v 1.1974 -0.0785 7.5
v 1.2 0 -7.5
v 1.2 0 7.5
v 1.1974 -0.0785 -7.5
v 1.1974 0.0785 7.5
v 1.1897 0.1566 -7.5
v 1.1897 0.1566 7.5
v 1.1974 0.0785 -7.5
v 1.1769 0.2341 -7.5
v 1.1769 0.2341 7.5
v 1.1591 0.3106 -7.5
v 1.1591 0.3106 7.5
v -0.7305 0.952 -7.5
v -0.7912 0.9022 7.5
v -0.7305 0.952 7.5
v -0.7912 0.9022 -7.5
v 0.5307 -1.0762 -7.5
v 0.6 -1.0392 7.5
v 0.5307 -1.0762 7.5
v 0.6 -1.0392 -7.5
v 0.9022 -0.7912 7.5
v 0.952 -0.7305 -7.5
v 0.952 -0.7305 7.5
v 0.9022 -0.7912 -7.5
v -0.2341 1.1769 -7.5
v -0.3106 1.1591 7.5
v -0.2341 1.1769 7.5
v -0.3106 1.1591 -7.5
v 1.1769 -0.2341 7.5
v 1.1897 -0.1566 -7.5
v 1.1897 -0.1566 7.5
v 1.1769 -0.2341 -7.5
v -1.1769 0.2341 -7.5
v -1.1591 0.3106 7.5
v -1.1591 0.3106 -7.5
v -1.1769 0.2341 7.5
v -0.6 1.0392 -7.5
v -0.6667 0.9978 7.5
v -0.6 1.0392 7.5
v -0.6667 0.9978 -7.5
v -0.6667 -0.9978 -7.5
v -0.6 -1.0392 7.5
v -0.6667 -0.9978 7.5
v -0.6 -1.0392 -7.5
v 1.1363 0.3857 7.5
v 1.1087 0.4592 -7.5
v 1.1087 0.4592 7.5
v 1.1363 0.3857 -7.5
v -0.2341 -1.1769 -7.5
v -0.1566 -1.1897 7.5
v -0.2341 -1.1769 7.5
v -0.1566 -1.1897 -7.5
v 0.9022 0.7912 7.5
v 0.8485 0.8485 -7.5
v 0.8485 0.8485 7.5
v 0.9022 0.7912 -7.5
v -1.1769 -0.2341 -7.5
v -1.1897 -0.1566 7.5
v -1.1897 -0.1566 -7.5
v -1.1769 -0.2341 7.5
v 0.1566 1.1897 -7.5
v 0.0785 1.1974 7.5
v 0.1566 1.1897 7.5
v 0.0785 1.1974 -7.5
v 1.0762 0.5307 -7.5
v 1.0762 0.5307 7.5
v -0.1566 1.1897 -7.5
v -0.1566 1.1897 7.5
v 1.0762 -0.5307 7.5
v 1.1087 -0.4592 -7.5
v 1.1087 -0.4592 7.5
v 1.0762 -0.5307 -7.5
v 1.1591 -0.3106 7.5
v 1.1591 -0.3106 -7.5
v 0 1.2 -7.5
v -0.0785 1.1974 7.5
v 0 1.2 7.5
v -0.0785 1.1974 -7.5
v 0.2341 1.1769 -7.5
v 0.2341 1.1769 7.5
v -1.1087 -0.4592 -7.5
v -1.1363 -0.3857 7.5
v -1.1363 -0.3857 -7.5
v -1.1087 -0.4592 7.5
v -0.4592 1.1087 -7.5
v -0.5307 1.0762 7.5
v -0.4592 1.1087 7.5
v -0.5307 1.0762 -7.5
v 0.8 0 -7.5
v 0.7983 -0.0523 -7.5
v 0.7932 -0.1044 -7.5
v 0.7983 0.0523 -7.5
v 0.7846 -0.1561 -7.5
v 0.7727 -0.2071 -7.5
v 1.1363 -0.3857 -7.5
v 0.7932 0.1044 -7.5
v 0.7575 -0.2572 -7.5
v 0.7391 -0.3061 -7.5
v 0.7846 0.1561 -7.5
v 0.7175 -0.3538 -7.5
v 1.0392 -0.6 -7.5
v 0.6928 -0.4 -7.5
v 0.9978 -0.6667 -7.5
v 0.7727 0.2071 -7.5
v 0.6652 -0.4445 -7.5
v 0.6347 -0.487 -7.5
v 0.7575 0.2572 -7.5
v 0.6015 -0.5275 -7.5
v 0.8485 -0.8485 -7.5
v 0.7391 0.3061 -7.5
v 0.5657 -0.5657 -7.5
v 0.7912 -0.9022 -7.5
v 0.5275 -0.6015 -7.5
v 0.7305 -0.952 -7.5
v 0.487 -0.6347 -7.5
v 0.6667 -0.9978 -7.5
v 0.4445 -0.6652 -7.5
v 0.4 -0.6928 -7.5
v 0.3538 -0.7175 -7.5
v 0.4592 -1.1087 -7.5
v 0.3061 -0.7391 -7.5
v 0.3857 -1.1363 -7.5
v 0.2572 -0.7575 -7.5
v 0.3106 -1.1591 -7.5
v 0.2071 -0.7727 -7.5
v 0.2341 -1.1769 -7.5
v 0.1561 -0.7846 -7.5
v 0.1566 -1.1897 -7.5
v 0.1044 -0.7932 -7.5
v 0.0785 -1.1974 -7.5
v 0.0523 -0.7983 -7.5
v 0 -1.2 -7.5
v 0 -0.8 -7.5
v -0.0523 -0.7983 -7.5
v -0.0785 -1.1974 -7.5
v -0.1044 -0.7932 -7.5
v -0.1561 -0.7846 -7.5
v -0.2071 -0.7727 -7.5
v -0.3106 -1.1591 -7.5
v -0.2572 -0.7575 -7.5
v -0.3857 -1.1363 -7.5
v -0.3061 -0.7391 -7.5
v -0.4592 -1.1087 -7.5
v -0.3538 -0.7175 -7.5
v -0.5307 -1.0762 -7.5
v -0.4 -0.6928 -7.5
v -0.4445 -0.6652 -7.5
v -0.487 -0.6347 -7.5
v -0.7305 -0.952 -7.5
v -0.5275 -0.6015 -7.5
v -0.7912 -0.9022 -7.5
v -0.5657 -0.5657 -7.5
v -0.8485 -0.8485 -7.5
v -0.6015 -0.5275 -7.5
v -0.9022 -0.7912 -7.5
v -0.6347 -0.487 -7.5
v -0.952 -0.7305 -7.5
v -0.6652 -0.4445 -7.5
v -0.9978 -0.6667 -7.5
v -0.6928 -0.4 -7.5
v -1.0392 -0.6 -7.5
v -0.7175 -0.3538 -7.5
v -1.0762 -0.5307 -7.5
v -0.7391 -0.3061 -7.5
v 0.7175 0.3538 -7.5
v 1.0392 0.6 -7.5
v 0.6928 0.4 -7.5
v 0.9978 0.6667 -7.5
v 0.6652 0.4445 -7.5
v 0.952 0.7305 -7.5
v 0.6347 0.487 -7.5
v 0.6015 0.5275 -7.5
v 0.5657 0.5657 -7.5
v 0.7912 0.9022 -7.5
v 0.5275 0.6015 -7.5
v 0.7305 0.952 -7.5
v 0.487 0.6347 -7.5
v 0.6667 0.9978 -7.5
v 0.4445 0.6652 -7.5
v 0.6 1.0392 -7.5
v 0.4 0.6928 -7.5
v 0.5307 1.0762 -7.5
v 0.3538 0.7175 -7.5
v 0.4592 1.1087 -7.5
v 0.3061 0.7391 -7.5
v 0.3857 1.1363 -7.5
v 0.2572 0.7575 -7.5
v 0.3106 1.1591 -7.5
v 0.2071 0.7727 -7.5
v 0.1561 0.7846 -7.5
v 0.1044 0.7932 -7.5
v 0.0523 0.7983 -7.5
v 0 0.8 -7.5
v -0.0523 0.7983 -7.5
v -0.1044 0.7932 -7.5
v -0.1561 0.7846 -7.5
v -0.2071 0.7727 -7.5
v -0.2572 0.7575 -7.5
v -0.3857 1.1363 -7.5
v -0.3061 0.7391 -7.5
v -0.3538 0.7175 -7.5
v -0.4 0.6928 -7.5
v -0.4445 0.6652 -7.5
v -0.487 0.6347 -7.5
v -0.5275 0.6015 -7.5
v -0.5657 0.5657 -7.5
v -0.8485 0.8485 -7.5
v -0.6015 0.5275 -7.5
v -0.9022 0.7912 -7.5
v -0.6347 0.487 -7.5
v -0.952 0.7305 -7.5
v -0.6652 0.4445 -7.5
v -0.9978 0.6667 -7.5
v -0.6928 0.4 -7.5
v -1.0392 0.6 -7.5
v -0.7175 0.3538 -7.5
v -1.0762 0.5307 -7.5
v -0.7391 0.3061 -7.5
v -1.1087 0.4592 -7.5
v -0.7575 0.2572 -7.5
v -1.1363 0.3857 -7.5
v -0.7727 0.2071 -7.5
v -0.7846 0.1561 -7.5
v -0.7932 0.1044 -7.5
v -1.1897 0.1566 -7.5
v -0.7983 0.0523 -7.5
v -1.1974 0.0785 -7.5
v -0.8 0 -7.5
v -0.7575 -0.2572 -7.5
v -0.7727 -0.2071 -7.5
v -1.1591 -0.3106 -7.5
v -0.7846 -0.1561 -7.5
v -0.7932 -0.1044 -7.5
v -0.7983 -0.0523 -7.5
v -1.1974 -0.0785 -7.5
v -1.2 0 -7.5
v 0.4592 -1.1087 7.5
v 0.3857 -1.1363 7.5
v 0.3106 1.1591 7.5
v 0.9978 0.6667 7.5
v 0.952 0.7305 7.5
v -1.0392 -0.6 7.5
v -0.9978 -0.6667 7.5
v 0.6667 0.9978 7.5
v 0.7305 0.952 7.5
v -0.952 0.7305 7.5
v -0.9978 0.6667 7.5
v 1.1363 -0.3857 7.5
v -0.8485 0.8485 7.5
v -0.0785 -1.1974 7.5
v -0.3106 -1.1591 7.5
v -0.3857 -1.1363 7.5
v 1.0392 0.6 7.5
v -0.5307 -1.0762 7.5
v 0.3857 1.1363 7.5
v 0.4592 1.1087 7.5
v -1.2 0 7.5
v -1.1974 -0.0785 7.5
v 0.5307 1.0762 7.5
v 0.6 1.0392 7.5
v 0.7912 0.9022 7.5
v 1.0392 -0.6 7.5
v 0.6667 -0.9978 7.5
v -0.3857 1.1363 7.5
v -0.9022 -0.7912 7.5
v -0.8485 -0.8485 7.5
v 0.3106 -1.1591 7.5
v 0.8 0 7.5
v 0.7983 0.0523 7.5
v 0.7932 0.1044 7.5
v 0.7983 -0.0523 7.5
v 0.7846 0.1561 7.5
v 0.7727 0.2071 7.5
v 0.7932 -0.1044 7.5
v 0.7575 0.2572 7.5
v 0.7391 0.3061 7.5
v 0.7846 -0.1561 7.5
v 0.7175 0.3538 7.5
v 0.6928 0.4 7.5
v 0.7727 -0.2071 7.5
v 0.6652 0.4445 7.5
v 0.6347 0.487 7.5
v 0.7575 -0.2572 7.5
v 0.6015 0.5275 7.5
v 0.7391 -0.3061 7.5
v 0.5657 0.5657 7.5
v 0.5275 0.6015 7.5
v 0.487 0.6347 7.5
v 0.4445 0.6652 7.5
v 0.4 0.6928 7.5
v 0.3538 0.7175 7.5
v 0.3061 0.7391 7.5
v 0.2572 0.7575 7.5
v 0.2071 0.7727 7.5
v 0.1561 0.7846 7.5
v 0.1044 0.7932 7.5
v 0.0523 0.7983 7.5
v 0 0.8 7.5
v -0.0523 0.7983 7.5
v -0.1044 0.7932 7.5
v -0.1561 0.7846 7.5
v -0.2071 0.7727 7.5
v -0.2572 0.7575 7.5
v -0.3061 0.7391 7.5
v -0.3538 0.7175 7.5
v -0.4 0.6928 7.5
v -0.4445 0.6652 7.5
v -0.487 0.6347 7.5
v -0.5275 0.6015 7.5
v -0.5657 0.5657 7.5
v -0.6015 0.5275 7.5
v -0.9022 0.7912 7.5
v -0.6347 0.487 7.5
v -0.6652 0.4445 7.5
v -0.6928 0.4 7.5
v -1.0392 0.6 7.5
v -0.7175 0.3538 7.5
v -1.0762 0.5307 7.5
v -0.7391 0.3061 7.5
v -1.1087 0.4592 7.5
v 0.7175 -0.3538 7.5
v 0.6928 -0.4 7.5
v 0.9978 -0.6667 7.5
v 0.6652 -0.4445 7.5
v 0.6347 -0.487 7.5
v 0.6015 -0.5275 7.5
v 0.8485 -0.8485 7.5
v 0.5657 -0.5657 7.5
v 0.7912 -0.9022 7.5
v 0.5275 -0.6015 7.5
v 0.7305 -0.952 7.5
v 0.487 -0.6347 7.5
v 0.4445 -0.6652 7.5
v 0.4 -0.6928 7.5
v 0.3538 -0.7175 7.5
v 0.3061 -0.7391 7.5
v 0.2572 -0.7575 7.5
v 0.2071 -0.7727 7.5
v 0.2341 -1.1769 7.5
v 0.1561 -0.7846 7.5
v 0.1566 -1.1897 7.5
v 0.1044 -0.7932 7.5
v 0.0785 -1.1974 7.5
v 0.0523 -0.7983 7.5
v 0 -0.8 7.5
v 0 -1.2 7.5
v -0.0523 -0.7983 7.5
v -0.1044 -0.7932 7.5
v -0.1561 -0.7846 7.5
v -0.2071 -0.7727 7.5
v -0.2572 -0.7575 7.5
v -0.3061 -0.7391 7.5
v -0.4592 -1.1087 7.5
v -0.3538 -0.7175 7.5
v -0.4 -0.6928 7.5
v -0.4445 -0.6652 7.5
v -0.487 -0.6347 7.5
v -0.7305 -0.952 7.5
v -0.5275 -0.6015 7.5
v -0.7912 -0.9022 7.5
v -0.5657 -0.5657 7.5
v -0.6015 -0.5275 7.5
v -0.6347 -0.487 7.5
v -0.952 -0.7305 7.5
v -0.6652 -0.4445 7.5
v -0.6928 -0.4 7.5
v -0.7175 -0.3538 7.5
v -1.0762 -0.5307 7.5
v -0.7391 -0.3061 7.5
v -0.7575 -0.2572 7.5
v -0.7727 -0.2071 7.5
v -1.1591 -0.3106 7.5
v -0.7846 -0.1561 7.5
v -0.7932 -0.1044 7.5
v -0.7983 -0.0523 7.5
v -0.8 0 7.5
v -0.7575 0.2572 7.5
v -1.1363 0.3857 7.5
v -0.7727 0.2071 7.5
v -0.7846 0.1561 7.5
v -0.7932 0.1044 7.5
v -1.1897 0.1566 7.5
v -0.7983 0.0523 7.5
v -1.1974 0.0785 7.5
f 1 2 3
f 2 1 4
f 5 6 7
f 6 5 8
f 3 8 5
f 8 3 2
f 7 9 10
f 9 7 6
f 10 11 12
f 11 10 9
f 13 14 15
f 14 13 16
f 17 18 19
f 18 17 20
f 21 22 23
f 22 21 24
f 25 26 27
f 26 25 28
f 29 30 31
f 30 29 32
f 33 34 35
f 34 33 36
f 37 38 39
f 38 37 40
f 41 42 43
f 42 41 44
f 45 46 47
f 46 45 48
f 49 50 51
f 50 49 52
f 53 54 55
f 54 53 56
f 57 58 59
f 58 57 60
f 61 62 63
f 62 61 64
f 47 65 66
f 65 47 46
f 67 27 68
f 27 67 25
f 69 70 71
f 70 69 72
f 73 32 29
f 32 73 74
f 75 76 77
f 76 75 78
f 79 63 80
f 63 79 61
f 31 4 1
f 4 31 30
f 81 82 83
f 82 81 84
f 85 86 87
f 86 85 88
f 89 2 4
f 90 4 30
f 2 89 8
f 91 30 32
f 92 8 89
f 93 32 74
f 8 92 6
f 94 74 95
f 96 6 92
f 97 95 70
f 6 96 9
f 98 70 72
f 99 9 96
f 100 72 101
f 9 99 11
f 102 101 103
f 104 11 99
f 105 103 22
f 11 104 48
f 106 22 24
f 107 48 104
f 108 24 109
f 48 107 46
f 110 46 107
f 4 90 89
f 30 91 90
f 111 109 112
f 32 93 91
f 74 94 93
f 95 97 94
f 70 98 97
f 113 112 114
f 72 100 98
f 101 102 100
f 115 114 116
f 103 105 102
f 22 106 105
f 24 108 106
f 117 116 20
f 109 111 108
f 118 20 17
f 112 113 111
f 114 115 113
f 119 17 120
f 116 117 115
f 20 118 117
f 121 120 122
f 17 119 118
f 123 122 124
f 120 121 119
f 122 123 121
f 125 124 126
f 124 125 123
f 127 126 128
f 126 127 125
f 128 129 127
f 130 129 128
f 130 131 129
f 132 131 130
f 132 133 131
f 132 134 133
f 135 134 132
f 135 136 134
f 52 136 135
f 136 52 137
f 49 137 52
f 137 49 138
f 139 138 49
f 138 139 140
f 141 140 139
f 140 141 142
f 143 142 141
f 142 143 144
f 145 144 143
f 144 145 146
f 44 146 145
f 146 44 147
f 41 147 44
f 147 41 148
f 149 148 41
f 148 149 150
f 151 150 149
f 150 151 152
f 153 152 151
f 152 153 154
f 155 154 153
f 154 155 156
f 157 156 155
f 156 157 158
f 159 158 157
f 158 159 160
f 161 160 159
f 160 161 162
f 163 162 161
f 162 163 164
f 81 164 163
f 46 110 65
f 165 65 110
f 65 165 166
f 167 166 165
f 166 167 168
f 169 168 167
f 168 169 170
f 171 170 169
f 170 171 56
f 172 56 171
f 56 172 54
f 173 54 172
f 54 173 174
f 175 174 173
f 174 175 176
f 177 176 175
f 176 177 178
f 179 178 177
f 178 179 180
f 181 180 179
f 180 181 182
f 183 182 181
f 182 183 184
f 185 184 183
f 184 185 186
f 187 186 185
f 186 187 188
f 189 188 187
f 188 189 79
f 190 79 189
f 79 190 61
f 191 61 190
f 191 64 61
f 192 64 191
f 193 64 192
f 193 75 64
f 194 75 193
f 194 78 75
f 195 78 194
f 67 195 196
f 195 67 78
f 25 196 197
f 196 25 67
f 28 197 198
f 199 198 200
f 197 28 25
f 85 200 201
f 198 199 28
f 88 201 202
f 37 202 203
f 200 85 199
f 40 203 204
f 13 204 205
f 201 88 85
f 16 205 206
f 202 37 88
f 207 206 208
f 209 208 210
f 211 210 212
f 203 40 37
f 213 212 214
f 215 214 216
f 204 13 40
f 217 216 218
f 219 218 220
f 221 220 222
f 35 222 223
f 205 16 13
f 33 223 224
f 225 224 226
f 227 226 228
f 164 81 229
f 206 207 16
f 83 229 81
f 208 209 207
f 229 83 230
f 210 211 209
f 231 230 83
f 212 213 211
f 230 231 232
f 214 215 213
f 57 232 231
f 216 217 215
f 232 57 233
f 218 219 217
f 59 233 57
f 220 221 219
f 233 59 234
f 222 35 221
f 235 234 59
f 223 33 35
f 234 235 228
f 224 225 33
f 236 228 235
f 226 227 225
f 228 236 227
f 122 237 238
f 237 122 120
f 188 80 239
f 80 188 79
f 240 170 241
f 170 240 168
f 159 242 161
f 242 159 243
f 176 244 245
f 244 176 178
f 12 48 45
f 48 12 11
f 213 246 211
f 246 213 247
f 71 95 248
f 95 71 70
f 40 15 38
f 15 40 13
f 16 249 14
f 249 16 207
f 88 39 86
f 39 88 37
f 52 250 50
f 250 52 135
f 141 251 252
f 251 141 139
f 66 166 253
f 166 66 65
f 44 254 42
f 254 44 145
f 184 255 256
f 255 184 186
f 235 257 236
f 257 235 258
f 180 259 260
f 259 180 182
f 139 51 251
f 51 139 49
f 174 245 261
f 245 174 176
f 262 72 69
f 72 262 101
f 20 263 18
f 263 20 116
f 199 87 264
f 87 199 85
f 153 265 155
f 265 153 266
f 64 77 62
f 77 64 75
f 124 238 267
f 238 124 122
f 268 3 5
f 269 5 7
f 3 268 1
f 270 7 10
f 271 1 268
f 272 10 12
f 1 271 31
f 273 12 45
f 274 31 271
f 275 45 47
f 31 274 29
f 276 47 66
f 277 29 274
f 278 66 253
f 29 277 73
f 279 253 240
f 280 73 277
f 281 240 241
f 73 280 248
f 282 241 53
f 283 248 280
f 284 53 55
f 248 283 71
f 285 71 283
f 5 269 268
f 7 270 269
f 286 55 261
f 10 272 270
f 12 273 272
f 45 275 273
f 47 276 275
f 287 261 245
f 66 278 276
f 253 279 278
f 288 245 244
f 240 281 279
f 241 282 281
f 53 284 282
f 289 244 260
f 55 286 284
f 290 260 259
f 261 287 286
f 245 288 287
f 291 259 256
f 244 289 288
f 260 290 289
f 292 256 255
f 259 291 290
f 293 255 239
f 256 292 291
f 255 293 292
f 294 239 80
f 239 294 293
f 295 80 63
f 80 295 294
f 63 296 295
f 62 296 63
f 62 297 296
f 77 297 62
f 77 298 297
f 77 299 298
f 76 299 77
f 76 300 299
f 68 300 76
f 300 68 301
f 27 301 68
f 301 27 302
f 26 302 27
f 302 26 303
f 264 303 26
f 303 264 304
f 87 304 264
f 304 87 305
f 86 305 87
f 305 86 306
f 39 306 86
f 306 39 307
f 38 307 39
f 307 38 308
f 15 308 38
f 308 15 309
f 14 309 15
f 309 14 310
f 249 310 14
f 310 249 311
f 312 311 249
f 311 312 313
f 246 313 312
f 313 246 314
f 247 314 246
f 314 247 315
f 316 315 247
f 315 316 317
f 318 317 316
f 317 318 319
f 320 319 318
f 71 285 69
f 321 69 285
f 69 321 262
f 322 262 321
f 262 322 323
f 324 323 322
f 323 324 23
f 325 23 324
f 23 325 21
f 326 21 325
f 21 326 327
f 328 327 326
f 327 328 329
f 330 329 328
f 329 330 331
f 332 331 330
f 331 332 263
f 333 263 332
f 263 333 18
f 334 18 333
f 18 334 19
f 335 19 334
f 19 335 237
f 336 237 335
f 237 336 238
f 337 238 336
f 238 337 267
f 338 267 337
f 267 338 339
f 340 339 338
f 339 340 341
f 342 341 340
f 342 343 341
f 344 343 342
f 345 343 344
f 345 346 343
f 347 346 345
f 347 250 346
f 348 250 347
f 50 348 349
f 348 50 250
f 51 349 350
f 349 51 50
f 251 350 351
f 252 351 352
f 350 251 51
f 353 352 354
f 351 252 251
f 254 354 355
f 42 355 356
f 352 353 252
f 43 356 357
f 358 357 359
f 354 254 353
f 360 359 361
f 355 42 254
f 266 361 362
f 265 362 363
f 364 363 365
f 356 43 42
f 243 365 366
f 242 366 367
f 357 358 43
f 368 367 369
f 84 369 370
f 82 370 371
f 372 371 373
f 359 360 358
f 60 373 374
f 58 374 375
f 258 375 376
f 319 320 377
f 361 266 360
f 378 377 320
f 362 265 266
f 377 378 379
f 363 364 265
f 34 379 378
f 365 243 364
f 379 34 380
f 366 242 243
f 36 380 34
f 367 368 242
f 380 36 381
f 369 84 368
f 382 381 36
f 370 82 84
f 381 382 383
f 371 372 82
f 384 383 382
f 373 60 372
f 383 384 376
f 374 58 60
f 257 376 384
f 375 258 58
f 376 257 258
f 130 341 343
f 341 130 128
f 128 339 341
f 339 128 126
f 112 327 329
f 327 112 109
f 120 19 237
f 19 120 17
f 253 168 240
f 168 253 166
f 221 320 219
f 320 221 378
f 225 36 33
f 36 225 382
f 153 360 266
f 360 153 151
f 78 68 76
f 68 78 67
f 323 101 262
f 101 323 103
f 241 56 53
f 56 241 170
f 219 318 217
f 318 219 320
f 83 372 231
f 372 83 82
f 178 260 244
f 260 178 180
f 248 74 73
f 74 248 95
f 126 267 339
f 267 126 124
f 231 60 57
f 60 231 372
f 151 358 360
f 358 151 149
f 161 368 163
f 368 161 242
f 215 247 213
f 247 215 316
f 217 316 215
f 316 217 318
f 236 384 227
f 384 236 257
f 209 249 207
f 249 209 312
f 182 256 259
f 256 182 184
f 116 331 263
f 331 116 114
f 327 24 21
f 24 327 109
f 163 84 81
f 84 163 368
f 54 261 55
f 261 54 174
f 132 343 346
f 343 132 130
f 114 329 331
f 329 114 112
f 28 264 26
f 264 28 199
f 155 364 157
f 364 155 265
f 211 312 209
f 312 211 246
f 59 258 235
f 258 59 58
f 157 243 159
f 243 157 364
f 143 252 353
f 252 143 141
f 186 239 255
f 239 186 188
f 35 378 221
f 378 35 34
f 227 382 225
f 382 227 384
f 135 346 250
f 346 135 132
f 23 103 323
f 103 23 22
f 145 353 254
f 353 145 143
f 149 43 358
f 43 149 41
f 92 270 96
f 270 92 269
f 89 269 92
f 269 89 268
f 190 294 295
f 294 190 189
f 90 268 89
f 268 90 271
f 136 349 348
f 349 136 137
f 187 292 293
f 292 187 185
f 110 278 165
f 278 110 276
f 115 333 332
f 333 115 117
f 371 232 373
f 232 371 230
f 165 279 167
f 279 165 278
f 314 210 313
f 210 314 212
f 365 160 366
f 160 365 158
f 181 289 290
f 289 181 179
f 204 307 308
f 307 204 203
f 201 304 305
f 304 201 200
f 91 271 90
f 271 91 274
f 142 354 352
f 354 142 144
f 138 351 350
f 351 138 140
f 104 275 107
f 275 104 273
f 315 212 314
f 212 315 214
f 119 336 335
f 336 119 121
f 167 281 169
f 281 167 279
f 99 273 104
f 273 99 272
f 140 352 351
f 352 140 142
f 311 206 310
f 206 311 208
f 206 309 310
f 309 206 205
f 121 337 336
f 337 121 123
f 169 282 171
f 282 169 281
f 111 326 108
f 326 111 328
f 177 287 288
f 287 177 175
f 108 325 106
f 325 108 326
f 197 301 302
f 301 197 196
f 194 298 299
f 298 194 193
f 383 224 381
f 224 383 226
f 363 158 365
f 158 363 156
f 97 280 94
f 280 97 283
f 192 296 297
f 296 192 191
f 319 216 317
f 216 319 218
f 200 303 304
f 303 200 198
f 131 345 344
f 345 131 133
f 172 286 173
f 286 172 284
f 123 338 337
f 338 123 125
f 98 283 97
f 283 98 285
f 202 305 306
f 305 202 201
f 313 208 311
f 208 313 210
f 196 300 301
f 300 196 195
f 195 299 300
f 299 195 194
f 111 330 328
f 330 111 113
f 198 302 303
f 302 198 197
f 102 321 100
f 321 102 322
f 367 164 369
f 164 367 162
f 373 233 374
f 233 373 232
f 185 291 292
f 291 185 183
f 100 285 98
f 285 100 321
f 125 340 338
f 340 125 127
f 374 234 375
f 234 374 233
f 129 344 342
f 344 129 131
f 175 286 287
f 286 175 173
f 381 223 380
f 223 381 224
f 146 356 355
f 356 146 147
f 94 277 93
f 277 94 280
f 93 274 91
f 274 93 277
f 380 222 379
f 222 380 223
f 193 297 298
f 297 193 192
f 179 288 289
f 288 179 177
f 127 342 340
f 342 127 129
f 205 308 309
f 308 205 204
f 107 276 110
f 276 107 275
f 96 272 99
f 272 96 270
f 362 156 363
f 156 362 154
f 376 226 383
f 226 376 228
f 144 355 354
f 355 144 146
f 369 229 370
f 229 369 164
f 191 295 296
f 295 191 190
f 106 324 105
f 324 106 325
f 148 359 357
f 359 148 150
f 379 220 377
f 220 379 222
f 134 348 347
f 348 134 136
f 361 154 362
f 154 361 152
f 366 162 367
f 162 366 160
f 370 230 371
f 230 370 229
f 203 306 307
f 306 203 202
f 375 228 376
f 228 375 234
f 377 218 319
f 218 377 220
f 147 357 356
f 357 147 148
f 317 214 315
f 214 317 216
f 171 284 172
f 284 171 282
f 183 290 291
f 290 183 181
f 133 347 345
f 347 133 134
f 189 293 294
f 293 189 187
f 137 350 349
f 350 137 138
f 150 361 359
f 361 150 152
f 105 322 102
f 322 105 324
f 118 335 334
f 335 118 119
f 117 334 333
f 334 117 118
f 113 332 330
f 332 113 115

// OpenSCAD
// PTFE heatshrink sleeving (simple hollow tube) - ONE connected solid

$fn = 96;

// Parameters
material = 1; //[1:1:1]
category = 1; //[1:1:1]
length = 15; //[8:30:1]
center = 1; //[0:1:1]
forced_id = 0; //[0:10:0.1]
type_od = 2.4; //[1.2:4.8:0.1]
type_id = 1.6; //[0.8:3.2:0.1]
eps_overlap = 0.8; //[0.5:2:0.1]

// Derived dimensions
id = (forced_id > 0) ? forced_id : type_id;
od = type_od + ((forced_id > 0) ? (forced_id - type_id) : 0);

// Safety / validity
wall_min = 0.2;
od_safe = max(od, id + 2*wall_min);
id_safe = min(id, od_safe - 2*wall_min);

// Tube module (hollow cylinder)
module ptfe_heatshrink_tube() {
  color([0.85, 0.85, 0.8])
  difference() {
    cylinder(h=length, r=od_safe/2, center=(center==1));
    cylinder(h=length + 2*eps_overlap, r=id_safe/2, center=(center==1));
  }
}

ptfe_heatshrink_tube();
